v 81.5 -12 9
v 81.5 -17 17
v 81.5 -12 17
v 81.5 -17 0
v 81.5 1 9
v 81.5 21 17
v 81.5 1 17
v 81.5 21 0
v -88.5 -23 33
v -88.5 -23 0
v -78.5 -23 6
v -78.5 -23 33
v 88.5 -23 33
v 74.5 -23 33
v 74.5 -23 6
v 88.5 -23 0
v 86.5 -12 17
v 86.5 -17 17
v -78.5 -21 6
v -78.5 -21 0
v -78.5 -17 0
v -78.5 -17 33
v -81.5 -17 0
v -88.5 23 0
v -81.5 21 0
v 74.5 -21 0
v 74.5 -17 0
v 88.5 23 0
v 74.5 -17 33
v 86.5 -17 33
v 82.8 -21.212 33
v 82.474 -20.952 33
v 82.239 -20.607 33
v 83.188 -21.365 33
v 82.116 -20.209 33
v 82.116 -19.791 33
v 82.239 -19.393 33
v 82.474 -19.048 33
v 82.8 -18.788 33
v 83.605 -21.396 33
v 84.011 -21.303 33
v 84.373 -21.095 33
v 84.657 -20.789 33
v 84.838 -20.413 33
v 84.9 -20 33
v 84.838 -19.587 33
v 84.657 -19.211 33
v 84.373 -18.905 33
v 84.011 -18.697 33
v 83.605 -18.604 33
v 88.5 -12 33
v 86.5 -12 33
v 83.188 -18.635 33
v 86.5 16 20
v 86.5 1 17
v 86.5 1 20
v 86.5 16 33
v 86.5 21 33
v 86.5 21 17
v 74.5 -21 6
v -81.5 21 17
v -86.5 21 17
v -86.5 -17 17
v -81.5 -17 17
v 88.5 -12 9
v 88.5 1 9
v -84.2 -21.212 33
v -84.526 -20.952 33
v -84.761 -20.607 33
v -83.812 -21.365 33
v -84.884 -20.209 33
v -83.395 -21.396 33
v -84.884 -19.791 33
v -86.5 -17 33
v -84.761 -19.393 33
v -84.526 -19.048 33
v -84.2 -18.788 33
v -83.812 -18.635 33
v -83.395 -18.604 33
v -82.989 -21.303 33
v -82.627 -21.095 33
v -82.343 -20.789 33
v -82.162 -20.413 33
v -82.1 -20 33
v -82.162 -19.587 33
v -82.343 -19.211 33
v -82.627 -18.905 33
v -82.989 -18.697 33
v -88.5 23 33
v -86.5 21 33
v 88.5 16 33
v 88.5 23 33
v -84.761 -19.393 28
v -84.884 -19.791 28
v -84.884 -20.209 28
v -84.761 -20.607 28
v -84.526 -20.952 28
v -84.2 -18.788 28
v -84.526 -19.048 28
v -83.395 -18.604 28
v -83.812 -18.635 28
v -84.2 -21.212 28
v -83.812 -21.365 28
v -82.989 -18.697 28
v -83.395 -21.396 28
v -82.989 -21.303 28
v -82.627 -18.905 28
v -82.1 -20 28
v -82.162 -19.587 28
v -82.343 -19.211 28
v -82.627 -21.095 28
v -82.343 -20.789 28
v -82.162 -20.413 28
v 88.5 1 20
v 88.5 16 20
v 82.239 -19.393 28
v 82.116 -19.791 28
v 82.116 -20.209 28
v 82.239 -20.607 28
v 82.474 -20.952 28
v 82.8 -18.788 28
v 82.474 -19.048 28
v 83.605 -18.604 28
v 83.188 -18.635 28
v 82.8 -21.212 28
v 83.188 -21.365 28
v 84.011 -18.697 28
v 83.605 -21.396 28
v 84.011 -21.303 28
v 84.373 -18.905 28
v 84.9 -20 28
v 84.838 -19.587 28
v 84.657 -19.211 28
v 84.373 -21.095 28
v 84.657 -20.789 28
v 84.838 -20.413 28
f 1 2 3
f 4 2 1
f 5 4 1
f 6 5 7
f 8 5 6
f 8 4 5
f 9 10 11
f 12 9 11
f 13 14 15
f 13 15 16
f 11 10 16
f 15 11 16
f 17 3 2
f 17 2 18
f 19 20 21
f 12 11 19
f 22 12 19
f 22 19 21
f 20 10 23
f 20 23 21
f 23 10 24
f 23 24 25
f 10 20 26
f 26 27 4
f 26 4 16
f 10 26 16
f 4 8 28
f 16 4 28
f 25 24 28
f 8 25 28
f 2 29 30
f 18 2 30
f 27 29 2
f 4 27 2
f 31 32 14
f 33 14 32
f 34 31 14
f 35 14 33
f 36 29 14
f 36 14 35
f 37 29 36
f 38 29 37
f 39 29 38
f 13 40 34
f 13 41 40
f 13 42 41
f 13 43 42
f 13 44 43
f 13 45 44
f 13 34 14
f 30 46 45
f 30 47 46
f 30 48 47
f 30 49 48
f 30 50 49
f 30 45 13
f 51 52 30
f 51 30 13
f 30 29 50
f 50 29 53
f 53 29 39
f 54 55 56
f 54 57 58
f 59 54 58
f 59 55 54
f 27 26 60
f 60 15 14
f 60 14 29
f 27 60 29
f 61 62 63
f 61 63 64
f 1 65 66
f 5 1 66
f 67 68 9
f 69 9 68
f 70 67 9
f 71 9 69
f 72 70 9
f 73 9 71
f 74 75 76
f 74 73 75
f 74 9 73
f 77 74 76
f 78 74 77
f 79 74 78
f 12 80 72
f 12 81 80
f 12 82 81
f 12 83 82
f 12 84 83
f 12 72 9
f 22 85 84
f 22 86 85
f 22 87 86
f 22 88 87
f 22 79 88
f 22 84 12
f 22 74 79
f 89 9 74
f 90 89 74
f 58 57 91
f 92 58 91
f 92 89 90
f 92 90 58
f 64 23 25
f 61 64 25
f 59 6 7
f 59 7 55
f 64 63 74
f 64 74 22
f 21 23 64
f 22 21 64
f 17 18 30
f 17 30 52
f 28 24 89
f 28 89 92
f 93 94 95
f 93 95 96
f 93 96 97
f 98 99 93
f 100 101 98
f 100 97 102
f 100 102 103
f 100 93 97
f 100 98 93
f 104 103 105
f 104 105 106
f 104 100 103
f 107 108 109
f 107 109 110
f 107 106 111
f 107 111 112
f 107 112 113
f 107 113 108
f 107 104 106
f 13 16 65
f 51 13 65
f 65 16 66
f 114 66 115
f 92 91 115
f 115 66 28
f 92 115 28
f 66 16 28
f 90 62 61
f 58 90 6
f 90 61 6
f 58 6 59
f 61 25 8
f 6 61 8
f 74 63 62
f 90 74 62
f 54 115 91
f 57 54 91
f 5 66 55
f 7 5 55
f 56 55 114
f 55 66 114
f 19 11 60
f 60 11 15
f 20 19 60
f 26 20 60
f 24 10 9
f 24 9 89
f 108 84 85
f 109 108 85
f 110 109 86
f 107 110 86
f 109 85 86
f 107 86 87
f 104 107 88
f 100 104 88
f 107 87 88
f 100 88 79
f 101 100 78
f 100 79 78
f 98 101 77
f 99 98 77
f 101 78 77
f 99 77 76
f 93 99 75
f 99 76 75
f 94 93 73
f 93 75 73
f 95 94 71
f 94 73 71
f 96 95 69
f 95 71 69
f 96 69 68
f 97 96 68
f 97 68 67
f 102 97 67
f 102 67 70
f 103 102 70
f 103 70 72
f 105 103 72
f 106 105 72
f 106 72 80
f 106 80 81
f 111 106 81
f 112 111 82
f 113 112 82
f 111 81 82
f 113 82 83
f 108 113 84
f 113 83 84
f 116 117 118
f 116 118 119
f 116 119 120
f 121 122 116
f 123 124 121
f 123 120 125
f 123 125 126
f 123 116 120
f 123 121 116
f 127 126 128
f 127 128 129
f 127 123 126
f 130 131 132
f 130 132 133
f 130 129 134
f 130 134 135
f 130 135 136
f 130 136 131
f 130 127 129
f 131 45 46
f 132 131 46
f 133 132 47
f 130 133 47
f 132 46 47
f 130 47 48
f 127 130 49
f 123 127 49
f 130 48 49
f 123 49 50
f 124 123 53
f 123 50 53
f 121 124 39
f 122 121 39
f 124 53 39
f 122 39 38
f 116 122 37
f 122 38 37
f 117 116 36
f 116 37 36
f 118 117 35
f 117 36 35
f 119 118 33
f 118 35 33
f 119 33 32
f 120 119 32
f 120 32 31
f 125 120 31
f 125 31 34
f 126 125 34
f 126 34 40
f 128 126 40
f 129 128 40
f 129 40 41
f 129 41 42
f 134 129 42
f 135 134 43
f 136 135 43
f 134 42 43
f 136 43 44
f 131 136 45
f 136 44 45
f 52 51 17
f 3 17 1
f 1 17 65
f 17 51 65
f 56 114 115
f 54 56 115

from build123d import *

# Parameters (mm, degrees)
F0_W      = 177
F0_H      = 46
F0_W_2    = 173
F0_H_2    = 38
F1_DEPTH  = 33
F2_W      = 153
F2_H      = 27
F3_DEPTH  = 6
F4_W      = 5
F4_H      = 38
F5_DEPTH  = 17
F6_W      = 13
F6_H      = 11
F7_DEPTH  = 25
F9_R      = 1.4
F10_DEPTH = 5
F11_W     = 153
F11_H     = 4
F12_DEPTH = 6


with BuildPart() as f1:
    # F0 (on Top) → F1 (new body)
    with BuildSketch(Plane.XY):
        Rectangle(F0_W, F0_H)
        with Locations((0, 2)):
            Rectangle(F0_W_2, F0_H_2, mode=Mode.SUBTRACT)
    extrude(amount=F1_DEPTH)

    # F2 (on face) → F3 (cut)
    with BuildSketch(Plane.XZ.offset(23)):
        with Locations((-2, 19.5)):
            Rectangle(F2_W, F2_H)
    extrude(amount=-F3_DEPTH, mode=Mode.SUBTRACT)

    # F4 (on Top) → F5 (join)
    with BuildSketch(Plane.XY):
        with Locations((-84, 2)):
            Rectangle(F4_W, F4_H)
        with Locations((84, 2)):
            Rectangle(F4_W, F4_H)
    extrude(amount=F5_DEPTH)

    # F6 (on face) → F7 (cut)
    with BuildSketch(Plane.YZ.offset(88.5)):
        Polygon((16, 33), (-12, 33), (-12, 20), (1, 20), (16, 20), align=None)
        with Locations((-5.5, 14.5)):
            Rectangle(F6_W, F6_H)
    extrude(amount=-F7_DEPTH, mode=Mode.SUBTRACT)

    # F9 (on offset) → F10 (cut)
    with BuildSketch(Plane.XY.offset(33)):
        with Locations((-83.5, -20)):
            Circle(F9_R)
        with Locations((83.5, -20)):
            Circle(F9_R)
    extrude(amount=-F10_DEPTH, mode=Mode.SUBTRACT)

    # F11 (on face) → F12 (cut)
    with BuildSketch(Plane.XY.offset(6)):
        with Locations((-2, -19)):
            Rectangle(F11_W, F11_H)
    extrude(amount=-F12_DEPTH, mode=Mode.SUBTRACT)


solid = f1.part
